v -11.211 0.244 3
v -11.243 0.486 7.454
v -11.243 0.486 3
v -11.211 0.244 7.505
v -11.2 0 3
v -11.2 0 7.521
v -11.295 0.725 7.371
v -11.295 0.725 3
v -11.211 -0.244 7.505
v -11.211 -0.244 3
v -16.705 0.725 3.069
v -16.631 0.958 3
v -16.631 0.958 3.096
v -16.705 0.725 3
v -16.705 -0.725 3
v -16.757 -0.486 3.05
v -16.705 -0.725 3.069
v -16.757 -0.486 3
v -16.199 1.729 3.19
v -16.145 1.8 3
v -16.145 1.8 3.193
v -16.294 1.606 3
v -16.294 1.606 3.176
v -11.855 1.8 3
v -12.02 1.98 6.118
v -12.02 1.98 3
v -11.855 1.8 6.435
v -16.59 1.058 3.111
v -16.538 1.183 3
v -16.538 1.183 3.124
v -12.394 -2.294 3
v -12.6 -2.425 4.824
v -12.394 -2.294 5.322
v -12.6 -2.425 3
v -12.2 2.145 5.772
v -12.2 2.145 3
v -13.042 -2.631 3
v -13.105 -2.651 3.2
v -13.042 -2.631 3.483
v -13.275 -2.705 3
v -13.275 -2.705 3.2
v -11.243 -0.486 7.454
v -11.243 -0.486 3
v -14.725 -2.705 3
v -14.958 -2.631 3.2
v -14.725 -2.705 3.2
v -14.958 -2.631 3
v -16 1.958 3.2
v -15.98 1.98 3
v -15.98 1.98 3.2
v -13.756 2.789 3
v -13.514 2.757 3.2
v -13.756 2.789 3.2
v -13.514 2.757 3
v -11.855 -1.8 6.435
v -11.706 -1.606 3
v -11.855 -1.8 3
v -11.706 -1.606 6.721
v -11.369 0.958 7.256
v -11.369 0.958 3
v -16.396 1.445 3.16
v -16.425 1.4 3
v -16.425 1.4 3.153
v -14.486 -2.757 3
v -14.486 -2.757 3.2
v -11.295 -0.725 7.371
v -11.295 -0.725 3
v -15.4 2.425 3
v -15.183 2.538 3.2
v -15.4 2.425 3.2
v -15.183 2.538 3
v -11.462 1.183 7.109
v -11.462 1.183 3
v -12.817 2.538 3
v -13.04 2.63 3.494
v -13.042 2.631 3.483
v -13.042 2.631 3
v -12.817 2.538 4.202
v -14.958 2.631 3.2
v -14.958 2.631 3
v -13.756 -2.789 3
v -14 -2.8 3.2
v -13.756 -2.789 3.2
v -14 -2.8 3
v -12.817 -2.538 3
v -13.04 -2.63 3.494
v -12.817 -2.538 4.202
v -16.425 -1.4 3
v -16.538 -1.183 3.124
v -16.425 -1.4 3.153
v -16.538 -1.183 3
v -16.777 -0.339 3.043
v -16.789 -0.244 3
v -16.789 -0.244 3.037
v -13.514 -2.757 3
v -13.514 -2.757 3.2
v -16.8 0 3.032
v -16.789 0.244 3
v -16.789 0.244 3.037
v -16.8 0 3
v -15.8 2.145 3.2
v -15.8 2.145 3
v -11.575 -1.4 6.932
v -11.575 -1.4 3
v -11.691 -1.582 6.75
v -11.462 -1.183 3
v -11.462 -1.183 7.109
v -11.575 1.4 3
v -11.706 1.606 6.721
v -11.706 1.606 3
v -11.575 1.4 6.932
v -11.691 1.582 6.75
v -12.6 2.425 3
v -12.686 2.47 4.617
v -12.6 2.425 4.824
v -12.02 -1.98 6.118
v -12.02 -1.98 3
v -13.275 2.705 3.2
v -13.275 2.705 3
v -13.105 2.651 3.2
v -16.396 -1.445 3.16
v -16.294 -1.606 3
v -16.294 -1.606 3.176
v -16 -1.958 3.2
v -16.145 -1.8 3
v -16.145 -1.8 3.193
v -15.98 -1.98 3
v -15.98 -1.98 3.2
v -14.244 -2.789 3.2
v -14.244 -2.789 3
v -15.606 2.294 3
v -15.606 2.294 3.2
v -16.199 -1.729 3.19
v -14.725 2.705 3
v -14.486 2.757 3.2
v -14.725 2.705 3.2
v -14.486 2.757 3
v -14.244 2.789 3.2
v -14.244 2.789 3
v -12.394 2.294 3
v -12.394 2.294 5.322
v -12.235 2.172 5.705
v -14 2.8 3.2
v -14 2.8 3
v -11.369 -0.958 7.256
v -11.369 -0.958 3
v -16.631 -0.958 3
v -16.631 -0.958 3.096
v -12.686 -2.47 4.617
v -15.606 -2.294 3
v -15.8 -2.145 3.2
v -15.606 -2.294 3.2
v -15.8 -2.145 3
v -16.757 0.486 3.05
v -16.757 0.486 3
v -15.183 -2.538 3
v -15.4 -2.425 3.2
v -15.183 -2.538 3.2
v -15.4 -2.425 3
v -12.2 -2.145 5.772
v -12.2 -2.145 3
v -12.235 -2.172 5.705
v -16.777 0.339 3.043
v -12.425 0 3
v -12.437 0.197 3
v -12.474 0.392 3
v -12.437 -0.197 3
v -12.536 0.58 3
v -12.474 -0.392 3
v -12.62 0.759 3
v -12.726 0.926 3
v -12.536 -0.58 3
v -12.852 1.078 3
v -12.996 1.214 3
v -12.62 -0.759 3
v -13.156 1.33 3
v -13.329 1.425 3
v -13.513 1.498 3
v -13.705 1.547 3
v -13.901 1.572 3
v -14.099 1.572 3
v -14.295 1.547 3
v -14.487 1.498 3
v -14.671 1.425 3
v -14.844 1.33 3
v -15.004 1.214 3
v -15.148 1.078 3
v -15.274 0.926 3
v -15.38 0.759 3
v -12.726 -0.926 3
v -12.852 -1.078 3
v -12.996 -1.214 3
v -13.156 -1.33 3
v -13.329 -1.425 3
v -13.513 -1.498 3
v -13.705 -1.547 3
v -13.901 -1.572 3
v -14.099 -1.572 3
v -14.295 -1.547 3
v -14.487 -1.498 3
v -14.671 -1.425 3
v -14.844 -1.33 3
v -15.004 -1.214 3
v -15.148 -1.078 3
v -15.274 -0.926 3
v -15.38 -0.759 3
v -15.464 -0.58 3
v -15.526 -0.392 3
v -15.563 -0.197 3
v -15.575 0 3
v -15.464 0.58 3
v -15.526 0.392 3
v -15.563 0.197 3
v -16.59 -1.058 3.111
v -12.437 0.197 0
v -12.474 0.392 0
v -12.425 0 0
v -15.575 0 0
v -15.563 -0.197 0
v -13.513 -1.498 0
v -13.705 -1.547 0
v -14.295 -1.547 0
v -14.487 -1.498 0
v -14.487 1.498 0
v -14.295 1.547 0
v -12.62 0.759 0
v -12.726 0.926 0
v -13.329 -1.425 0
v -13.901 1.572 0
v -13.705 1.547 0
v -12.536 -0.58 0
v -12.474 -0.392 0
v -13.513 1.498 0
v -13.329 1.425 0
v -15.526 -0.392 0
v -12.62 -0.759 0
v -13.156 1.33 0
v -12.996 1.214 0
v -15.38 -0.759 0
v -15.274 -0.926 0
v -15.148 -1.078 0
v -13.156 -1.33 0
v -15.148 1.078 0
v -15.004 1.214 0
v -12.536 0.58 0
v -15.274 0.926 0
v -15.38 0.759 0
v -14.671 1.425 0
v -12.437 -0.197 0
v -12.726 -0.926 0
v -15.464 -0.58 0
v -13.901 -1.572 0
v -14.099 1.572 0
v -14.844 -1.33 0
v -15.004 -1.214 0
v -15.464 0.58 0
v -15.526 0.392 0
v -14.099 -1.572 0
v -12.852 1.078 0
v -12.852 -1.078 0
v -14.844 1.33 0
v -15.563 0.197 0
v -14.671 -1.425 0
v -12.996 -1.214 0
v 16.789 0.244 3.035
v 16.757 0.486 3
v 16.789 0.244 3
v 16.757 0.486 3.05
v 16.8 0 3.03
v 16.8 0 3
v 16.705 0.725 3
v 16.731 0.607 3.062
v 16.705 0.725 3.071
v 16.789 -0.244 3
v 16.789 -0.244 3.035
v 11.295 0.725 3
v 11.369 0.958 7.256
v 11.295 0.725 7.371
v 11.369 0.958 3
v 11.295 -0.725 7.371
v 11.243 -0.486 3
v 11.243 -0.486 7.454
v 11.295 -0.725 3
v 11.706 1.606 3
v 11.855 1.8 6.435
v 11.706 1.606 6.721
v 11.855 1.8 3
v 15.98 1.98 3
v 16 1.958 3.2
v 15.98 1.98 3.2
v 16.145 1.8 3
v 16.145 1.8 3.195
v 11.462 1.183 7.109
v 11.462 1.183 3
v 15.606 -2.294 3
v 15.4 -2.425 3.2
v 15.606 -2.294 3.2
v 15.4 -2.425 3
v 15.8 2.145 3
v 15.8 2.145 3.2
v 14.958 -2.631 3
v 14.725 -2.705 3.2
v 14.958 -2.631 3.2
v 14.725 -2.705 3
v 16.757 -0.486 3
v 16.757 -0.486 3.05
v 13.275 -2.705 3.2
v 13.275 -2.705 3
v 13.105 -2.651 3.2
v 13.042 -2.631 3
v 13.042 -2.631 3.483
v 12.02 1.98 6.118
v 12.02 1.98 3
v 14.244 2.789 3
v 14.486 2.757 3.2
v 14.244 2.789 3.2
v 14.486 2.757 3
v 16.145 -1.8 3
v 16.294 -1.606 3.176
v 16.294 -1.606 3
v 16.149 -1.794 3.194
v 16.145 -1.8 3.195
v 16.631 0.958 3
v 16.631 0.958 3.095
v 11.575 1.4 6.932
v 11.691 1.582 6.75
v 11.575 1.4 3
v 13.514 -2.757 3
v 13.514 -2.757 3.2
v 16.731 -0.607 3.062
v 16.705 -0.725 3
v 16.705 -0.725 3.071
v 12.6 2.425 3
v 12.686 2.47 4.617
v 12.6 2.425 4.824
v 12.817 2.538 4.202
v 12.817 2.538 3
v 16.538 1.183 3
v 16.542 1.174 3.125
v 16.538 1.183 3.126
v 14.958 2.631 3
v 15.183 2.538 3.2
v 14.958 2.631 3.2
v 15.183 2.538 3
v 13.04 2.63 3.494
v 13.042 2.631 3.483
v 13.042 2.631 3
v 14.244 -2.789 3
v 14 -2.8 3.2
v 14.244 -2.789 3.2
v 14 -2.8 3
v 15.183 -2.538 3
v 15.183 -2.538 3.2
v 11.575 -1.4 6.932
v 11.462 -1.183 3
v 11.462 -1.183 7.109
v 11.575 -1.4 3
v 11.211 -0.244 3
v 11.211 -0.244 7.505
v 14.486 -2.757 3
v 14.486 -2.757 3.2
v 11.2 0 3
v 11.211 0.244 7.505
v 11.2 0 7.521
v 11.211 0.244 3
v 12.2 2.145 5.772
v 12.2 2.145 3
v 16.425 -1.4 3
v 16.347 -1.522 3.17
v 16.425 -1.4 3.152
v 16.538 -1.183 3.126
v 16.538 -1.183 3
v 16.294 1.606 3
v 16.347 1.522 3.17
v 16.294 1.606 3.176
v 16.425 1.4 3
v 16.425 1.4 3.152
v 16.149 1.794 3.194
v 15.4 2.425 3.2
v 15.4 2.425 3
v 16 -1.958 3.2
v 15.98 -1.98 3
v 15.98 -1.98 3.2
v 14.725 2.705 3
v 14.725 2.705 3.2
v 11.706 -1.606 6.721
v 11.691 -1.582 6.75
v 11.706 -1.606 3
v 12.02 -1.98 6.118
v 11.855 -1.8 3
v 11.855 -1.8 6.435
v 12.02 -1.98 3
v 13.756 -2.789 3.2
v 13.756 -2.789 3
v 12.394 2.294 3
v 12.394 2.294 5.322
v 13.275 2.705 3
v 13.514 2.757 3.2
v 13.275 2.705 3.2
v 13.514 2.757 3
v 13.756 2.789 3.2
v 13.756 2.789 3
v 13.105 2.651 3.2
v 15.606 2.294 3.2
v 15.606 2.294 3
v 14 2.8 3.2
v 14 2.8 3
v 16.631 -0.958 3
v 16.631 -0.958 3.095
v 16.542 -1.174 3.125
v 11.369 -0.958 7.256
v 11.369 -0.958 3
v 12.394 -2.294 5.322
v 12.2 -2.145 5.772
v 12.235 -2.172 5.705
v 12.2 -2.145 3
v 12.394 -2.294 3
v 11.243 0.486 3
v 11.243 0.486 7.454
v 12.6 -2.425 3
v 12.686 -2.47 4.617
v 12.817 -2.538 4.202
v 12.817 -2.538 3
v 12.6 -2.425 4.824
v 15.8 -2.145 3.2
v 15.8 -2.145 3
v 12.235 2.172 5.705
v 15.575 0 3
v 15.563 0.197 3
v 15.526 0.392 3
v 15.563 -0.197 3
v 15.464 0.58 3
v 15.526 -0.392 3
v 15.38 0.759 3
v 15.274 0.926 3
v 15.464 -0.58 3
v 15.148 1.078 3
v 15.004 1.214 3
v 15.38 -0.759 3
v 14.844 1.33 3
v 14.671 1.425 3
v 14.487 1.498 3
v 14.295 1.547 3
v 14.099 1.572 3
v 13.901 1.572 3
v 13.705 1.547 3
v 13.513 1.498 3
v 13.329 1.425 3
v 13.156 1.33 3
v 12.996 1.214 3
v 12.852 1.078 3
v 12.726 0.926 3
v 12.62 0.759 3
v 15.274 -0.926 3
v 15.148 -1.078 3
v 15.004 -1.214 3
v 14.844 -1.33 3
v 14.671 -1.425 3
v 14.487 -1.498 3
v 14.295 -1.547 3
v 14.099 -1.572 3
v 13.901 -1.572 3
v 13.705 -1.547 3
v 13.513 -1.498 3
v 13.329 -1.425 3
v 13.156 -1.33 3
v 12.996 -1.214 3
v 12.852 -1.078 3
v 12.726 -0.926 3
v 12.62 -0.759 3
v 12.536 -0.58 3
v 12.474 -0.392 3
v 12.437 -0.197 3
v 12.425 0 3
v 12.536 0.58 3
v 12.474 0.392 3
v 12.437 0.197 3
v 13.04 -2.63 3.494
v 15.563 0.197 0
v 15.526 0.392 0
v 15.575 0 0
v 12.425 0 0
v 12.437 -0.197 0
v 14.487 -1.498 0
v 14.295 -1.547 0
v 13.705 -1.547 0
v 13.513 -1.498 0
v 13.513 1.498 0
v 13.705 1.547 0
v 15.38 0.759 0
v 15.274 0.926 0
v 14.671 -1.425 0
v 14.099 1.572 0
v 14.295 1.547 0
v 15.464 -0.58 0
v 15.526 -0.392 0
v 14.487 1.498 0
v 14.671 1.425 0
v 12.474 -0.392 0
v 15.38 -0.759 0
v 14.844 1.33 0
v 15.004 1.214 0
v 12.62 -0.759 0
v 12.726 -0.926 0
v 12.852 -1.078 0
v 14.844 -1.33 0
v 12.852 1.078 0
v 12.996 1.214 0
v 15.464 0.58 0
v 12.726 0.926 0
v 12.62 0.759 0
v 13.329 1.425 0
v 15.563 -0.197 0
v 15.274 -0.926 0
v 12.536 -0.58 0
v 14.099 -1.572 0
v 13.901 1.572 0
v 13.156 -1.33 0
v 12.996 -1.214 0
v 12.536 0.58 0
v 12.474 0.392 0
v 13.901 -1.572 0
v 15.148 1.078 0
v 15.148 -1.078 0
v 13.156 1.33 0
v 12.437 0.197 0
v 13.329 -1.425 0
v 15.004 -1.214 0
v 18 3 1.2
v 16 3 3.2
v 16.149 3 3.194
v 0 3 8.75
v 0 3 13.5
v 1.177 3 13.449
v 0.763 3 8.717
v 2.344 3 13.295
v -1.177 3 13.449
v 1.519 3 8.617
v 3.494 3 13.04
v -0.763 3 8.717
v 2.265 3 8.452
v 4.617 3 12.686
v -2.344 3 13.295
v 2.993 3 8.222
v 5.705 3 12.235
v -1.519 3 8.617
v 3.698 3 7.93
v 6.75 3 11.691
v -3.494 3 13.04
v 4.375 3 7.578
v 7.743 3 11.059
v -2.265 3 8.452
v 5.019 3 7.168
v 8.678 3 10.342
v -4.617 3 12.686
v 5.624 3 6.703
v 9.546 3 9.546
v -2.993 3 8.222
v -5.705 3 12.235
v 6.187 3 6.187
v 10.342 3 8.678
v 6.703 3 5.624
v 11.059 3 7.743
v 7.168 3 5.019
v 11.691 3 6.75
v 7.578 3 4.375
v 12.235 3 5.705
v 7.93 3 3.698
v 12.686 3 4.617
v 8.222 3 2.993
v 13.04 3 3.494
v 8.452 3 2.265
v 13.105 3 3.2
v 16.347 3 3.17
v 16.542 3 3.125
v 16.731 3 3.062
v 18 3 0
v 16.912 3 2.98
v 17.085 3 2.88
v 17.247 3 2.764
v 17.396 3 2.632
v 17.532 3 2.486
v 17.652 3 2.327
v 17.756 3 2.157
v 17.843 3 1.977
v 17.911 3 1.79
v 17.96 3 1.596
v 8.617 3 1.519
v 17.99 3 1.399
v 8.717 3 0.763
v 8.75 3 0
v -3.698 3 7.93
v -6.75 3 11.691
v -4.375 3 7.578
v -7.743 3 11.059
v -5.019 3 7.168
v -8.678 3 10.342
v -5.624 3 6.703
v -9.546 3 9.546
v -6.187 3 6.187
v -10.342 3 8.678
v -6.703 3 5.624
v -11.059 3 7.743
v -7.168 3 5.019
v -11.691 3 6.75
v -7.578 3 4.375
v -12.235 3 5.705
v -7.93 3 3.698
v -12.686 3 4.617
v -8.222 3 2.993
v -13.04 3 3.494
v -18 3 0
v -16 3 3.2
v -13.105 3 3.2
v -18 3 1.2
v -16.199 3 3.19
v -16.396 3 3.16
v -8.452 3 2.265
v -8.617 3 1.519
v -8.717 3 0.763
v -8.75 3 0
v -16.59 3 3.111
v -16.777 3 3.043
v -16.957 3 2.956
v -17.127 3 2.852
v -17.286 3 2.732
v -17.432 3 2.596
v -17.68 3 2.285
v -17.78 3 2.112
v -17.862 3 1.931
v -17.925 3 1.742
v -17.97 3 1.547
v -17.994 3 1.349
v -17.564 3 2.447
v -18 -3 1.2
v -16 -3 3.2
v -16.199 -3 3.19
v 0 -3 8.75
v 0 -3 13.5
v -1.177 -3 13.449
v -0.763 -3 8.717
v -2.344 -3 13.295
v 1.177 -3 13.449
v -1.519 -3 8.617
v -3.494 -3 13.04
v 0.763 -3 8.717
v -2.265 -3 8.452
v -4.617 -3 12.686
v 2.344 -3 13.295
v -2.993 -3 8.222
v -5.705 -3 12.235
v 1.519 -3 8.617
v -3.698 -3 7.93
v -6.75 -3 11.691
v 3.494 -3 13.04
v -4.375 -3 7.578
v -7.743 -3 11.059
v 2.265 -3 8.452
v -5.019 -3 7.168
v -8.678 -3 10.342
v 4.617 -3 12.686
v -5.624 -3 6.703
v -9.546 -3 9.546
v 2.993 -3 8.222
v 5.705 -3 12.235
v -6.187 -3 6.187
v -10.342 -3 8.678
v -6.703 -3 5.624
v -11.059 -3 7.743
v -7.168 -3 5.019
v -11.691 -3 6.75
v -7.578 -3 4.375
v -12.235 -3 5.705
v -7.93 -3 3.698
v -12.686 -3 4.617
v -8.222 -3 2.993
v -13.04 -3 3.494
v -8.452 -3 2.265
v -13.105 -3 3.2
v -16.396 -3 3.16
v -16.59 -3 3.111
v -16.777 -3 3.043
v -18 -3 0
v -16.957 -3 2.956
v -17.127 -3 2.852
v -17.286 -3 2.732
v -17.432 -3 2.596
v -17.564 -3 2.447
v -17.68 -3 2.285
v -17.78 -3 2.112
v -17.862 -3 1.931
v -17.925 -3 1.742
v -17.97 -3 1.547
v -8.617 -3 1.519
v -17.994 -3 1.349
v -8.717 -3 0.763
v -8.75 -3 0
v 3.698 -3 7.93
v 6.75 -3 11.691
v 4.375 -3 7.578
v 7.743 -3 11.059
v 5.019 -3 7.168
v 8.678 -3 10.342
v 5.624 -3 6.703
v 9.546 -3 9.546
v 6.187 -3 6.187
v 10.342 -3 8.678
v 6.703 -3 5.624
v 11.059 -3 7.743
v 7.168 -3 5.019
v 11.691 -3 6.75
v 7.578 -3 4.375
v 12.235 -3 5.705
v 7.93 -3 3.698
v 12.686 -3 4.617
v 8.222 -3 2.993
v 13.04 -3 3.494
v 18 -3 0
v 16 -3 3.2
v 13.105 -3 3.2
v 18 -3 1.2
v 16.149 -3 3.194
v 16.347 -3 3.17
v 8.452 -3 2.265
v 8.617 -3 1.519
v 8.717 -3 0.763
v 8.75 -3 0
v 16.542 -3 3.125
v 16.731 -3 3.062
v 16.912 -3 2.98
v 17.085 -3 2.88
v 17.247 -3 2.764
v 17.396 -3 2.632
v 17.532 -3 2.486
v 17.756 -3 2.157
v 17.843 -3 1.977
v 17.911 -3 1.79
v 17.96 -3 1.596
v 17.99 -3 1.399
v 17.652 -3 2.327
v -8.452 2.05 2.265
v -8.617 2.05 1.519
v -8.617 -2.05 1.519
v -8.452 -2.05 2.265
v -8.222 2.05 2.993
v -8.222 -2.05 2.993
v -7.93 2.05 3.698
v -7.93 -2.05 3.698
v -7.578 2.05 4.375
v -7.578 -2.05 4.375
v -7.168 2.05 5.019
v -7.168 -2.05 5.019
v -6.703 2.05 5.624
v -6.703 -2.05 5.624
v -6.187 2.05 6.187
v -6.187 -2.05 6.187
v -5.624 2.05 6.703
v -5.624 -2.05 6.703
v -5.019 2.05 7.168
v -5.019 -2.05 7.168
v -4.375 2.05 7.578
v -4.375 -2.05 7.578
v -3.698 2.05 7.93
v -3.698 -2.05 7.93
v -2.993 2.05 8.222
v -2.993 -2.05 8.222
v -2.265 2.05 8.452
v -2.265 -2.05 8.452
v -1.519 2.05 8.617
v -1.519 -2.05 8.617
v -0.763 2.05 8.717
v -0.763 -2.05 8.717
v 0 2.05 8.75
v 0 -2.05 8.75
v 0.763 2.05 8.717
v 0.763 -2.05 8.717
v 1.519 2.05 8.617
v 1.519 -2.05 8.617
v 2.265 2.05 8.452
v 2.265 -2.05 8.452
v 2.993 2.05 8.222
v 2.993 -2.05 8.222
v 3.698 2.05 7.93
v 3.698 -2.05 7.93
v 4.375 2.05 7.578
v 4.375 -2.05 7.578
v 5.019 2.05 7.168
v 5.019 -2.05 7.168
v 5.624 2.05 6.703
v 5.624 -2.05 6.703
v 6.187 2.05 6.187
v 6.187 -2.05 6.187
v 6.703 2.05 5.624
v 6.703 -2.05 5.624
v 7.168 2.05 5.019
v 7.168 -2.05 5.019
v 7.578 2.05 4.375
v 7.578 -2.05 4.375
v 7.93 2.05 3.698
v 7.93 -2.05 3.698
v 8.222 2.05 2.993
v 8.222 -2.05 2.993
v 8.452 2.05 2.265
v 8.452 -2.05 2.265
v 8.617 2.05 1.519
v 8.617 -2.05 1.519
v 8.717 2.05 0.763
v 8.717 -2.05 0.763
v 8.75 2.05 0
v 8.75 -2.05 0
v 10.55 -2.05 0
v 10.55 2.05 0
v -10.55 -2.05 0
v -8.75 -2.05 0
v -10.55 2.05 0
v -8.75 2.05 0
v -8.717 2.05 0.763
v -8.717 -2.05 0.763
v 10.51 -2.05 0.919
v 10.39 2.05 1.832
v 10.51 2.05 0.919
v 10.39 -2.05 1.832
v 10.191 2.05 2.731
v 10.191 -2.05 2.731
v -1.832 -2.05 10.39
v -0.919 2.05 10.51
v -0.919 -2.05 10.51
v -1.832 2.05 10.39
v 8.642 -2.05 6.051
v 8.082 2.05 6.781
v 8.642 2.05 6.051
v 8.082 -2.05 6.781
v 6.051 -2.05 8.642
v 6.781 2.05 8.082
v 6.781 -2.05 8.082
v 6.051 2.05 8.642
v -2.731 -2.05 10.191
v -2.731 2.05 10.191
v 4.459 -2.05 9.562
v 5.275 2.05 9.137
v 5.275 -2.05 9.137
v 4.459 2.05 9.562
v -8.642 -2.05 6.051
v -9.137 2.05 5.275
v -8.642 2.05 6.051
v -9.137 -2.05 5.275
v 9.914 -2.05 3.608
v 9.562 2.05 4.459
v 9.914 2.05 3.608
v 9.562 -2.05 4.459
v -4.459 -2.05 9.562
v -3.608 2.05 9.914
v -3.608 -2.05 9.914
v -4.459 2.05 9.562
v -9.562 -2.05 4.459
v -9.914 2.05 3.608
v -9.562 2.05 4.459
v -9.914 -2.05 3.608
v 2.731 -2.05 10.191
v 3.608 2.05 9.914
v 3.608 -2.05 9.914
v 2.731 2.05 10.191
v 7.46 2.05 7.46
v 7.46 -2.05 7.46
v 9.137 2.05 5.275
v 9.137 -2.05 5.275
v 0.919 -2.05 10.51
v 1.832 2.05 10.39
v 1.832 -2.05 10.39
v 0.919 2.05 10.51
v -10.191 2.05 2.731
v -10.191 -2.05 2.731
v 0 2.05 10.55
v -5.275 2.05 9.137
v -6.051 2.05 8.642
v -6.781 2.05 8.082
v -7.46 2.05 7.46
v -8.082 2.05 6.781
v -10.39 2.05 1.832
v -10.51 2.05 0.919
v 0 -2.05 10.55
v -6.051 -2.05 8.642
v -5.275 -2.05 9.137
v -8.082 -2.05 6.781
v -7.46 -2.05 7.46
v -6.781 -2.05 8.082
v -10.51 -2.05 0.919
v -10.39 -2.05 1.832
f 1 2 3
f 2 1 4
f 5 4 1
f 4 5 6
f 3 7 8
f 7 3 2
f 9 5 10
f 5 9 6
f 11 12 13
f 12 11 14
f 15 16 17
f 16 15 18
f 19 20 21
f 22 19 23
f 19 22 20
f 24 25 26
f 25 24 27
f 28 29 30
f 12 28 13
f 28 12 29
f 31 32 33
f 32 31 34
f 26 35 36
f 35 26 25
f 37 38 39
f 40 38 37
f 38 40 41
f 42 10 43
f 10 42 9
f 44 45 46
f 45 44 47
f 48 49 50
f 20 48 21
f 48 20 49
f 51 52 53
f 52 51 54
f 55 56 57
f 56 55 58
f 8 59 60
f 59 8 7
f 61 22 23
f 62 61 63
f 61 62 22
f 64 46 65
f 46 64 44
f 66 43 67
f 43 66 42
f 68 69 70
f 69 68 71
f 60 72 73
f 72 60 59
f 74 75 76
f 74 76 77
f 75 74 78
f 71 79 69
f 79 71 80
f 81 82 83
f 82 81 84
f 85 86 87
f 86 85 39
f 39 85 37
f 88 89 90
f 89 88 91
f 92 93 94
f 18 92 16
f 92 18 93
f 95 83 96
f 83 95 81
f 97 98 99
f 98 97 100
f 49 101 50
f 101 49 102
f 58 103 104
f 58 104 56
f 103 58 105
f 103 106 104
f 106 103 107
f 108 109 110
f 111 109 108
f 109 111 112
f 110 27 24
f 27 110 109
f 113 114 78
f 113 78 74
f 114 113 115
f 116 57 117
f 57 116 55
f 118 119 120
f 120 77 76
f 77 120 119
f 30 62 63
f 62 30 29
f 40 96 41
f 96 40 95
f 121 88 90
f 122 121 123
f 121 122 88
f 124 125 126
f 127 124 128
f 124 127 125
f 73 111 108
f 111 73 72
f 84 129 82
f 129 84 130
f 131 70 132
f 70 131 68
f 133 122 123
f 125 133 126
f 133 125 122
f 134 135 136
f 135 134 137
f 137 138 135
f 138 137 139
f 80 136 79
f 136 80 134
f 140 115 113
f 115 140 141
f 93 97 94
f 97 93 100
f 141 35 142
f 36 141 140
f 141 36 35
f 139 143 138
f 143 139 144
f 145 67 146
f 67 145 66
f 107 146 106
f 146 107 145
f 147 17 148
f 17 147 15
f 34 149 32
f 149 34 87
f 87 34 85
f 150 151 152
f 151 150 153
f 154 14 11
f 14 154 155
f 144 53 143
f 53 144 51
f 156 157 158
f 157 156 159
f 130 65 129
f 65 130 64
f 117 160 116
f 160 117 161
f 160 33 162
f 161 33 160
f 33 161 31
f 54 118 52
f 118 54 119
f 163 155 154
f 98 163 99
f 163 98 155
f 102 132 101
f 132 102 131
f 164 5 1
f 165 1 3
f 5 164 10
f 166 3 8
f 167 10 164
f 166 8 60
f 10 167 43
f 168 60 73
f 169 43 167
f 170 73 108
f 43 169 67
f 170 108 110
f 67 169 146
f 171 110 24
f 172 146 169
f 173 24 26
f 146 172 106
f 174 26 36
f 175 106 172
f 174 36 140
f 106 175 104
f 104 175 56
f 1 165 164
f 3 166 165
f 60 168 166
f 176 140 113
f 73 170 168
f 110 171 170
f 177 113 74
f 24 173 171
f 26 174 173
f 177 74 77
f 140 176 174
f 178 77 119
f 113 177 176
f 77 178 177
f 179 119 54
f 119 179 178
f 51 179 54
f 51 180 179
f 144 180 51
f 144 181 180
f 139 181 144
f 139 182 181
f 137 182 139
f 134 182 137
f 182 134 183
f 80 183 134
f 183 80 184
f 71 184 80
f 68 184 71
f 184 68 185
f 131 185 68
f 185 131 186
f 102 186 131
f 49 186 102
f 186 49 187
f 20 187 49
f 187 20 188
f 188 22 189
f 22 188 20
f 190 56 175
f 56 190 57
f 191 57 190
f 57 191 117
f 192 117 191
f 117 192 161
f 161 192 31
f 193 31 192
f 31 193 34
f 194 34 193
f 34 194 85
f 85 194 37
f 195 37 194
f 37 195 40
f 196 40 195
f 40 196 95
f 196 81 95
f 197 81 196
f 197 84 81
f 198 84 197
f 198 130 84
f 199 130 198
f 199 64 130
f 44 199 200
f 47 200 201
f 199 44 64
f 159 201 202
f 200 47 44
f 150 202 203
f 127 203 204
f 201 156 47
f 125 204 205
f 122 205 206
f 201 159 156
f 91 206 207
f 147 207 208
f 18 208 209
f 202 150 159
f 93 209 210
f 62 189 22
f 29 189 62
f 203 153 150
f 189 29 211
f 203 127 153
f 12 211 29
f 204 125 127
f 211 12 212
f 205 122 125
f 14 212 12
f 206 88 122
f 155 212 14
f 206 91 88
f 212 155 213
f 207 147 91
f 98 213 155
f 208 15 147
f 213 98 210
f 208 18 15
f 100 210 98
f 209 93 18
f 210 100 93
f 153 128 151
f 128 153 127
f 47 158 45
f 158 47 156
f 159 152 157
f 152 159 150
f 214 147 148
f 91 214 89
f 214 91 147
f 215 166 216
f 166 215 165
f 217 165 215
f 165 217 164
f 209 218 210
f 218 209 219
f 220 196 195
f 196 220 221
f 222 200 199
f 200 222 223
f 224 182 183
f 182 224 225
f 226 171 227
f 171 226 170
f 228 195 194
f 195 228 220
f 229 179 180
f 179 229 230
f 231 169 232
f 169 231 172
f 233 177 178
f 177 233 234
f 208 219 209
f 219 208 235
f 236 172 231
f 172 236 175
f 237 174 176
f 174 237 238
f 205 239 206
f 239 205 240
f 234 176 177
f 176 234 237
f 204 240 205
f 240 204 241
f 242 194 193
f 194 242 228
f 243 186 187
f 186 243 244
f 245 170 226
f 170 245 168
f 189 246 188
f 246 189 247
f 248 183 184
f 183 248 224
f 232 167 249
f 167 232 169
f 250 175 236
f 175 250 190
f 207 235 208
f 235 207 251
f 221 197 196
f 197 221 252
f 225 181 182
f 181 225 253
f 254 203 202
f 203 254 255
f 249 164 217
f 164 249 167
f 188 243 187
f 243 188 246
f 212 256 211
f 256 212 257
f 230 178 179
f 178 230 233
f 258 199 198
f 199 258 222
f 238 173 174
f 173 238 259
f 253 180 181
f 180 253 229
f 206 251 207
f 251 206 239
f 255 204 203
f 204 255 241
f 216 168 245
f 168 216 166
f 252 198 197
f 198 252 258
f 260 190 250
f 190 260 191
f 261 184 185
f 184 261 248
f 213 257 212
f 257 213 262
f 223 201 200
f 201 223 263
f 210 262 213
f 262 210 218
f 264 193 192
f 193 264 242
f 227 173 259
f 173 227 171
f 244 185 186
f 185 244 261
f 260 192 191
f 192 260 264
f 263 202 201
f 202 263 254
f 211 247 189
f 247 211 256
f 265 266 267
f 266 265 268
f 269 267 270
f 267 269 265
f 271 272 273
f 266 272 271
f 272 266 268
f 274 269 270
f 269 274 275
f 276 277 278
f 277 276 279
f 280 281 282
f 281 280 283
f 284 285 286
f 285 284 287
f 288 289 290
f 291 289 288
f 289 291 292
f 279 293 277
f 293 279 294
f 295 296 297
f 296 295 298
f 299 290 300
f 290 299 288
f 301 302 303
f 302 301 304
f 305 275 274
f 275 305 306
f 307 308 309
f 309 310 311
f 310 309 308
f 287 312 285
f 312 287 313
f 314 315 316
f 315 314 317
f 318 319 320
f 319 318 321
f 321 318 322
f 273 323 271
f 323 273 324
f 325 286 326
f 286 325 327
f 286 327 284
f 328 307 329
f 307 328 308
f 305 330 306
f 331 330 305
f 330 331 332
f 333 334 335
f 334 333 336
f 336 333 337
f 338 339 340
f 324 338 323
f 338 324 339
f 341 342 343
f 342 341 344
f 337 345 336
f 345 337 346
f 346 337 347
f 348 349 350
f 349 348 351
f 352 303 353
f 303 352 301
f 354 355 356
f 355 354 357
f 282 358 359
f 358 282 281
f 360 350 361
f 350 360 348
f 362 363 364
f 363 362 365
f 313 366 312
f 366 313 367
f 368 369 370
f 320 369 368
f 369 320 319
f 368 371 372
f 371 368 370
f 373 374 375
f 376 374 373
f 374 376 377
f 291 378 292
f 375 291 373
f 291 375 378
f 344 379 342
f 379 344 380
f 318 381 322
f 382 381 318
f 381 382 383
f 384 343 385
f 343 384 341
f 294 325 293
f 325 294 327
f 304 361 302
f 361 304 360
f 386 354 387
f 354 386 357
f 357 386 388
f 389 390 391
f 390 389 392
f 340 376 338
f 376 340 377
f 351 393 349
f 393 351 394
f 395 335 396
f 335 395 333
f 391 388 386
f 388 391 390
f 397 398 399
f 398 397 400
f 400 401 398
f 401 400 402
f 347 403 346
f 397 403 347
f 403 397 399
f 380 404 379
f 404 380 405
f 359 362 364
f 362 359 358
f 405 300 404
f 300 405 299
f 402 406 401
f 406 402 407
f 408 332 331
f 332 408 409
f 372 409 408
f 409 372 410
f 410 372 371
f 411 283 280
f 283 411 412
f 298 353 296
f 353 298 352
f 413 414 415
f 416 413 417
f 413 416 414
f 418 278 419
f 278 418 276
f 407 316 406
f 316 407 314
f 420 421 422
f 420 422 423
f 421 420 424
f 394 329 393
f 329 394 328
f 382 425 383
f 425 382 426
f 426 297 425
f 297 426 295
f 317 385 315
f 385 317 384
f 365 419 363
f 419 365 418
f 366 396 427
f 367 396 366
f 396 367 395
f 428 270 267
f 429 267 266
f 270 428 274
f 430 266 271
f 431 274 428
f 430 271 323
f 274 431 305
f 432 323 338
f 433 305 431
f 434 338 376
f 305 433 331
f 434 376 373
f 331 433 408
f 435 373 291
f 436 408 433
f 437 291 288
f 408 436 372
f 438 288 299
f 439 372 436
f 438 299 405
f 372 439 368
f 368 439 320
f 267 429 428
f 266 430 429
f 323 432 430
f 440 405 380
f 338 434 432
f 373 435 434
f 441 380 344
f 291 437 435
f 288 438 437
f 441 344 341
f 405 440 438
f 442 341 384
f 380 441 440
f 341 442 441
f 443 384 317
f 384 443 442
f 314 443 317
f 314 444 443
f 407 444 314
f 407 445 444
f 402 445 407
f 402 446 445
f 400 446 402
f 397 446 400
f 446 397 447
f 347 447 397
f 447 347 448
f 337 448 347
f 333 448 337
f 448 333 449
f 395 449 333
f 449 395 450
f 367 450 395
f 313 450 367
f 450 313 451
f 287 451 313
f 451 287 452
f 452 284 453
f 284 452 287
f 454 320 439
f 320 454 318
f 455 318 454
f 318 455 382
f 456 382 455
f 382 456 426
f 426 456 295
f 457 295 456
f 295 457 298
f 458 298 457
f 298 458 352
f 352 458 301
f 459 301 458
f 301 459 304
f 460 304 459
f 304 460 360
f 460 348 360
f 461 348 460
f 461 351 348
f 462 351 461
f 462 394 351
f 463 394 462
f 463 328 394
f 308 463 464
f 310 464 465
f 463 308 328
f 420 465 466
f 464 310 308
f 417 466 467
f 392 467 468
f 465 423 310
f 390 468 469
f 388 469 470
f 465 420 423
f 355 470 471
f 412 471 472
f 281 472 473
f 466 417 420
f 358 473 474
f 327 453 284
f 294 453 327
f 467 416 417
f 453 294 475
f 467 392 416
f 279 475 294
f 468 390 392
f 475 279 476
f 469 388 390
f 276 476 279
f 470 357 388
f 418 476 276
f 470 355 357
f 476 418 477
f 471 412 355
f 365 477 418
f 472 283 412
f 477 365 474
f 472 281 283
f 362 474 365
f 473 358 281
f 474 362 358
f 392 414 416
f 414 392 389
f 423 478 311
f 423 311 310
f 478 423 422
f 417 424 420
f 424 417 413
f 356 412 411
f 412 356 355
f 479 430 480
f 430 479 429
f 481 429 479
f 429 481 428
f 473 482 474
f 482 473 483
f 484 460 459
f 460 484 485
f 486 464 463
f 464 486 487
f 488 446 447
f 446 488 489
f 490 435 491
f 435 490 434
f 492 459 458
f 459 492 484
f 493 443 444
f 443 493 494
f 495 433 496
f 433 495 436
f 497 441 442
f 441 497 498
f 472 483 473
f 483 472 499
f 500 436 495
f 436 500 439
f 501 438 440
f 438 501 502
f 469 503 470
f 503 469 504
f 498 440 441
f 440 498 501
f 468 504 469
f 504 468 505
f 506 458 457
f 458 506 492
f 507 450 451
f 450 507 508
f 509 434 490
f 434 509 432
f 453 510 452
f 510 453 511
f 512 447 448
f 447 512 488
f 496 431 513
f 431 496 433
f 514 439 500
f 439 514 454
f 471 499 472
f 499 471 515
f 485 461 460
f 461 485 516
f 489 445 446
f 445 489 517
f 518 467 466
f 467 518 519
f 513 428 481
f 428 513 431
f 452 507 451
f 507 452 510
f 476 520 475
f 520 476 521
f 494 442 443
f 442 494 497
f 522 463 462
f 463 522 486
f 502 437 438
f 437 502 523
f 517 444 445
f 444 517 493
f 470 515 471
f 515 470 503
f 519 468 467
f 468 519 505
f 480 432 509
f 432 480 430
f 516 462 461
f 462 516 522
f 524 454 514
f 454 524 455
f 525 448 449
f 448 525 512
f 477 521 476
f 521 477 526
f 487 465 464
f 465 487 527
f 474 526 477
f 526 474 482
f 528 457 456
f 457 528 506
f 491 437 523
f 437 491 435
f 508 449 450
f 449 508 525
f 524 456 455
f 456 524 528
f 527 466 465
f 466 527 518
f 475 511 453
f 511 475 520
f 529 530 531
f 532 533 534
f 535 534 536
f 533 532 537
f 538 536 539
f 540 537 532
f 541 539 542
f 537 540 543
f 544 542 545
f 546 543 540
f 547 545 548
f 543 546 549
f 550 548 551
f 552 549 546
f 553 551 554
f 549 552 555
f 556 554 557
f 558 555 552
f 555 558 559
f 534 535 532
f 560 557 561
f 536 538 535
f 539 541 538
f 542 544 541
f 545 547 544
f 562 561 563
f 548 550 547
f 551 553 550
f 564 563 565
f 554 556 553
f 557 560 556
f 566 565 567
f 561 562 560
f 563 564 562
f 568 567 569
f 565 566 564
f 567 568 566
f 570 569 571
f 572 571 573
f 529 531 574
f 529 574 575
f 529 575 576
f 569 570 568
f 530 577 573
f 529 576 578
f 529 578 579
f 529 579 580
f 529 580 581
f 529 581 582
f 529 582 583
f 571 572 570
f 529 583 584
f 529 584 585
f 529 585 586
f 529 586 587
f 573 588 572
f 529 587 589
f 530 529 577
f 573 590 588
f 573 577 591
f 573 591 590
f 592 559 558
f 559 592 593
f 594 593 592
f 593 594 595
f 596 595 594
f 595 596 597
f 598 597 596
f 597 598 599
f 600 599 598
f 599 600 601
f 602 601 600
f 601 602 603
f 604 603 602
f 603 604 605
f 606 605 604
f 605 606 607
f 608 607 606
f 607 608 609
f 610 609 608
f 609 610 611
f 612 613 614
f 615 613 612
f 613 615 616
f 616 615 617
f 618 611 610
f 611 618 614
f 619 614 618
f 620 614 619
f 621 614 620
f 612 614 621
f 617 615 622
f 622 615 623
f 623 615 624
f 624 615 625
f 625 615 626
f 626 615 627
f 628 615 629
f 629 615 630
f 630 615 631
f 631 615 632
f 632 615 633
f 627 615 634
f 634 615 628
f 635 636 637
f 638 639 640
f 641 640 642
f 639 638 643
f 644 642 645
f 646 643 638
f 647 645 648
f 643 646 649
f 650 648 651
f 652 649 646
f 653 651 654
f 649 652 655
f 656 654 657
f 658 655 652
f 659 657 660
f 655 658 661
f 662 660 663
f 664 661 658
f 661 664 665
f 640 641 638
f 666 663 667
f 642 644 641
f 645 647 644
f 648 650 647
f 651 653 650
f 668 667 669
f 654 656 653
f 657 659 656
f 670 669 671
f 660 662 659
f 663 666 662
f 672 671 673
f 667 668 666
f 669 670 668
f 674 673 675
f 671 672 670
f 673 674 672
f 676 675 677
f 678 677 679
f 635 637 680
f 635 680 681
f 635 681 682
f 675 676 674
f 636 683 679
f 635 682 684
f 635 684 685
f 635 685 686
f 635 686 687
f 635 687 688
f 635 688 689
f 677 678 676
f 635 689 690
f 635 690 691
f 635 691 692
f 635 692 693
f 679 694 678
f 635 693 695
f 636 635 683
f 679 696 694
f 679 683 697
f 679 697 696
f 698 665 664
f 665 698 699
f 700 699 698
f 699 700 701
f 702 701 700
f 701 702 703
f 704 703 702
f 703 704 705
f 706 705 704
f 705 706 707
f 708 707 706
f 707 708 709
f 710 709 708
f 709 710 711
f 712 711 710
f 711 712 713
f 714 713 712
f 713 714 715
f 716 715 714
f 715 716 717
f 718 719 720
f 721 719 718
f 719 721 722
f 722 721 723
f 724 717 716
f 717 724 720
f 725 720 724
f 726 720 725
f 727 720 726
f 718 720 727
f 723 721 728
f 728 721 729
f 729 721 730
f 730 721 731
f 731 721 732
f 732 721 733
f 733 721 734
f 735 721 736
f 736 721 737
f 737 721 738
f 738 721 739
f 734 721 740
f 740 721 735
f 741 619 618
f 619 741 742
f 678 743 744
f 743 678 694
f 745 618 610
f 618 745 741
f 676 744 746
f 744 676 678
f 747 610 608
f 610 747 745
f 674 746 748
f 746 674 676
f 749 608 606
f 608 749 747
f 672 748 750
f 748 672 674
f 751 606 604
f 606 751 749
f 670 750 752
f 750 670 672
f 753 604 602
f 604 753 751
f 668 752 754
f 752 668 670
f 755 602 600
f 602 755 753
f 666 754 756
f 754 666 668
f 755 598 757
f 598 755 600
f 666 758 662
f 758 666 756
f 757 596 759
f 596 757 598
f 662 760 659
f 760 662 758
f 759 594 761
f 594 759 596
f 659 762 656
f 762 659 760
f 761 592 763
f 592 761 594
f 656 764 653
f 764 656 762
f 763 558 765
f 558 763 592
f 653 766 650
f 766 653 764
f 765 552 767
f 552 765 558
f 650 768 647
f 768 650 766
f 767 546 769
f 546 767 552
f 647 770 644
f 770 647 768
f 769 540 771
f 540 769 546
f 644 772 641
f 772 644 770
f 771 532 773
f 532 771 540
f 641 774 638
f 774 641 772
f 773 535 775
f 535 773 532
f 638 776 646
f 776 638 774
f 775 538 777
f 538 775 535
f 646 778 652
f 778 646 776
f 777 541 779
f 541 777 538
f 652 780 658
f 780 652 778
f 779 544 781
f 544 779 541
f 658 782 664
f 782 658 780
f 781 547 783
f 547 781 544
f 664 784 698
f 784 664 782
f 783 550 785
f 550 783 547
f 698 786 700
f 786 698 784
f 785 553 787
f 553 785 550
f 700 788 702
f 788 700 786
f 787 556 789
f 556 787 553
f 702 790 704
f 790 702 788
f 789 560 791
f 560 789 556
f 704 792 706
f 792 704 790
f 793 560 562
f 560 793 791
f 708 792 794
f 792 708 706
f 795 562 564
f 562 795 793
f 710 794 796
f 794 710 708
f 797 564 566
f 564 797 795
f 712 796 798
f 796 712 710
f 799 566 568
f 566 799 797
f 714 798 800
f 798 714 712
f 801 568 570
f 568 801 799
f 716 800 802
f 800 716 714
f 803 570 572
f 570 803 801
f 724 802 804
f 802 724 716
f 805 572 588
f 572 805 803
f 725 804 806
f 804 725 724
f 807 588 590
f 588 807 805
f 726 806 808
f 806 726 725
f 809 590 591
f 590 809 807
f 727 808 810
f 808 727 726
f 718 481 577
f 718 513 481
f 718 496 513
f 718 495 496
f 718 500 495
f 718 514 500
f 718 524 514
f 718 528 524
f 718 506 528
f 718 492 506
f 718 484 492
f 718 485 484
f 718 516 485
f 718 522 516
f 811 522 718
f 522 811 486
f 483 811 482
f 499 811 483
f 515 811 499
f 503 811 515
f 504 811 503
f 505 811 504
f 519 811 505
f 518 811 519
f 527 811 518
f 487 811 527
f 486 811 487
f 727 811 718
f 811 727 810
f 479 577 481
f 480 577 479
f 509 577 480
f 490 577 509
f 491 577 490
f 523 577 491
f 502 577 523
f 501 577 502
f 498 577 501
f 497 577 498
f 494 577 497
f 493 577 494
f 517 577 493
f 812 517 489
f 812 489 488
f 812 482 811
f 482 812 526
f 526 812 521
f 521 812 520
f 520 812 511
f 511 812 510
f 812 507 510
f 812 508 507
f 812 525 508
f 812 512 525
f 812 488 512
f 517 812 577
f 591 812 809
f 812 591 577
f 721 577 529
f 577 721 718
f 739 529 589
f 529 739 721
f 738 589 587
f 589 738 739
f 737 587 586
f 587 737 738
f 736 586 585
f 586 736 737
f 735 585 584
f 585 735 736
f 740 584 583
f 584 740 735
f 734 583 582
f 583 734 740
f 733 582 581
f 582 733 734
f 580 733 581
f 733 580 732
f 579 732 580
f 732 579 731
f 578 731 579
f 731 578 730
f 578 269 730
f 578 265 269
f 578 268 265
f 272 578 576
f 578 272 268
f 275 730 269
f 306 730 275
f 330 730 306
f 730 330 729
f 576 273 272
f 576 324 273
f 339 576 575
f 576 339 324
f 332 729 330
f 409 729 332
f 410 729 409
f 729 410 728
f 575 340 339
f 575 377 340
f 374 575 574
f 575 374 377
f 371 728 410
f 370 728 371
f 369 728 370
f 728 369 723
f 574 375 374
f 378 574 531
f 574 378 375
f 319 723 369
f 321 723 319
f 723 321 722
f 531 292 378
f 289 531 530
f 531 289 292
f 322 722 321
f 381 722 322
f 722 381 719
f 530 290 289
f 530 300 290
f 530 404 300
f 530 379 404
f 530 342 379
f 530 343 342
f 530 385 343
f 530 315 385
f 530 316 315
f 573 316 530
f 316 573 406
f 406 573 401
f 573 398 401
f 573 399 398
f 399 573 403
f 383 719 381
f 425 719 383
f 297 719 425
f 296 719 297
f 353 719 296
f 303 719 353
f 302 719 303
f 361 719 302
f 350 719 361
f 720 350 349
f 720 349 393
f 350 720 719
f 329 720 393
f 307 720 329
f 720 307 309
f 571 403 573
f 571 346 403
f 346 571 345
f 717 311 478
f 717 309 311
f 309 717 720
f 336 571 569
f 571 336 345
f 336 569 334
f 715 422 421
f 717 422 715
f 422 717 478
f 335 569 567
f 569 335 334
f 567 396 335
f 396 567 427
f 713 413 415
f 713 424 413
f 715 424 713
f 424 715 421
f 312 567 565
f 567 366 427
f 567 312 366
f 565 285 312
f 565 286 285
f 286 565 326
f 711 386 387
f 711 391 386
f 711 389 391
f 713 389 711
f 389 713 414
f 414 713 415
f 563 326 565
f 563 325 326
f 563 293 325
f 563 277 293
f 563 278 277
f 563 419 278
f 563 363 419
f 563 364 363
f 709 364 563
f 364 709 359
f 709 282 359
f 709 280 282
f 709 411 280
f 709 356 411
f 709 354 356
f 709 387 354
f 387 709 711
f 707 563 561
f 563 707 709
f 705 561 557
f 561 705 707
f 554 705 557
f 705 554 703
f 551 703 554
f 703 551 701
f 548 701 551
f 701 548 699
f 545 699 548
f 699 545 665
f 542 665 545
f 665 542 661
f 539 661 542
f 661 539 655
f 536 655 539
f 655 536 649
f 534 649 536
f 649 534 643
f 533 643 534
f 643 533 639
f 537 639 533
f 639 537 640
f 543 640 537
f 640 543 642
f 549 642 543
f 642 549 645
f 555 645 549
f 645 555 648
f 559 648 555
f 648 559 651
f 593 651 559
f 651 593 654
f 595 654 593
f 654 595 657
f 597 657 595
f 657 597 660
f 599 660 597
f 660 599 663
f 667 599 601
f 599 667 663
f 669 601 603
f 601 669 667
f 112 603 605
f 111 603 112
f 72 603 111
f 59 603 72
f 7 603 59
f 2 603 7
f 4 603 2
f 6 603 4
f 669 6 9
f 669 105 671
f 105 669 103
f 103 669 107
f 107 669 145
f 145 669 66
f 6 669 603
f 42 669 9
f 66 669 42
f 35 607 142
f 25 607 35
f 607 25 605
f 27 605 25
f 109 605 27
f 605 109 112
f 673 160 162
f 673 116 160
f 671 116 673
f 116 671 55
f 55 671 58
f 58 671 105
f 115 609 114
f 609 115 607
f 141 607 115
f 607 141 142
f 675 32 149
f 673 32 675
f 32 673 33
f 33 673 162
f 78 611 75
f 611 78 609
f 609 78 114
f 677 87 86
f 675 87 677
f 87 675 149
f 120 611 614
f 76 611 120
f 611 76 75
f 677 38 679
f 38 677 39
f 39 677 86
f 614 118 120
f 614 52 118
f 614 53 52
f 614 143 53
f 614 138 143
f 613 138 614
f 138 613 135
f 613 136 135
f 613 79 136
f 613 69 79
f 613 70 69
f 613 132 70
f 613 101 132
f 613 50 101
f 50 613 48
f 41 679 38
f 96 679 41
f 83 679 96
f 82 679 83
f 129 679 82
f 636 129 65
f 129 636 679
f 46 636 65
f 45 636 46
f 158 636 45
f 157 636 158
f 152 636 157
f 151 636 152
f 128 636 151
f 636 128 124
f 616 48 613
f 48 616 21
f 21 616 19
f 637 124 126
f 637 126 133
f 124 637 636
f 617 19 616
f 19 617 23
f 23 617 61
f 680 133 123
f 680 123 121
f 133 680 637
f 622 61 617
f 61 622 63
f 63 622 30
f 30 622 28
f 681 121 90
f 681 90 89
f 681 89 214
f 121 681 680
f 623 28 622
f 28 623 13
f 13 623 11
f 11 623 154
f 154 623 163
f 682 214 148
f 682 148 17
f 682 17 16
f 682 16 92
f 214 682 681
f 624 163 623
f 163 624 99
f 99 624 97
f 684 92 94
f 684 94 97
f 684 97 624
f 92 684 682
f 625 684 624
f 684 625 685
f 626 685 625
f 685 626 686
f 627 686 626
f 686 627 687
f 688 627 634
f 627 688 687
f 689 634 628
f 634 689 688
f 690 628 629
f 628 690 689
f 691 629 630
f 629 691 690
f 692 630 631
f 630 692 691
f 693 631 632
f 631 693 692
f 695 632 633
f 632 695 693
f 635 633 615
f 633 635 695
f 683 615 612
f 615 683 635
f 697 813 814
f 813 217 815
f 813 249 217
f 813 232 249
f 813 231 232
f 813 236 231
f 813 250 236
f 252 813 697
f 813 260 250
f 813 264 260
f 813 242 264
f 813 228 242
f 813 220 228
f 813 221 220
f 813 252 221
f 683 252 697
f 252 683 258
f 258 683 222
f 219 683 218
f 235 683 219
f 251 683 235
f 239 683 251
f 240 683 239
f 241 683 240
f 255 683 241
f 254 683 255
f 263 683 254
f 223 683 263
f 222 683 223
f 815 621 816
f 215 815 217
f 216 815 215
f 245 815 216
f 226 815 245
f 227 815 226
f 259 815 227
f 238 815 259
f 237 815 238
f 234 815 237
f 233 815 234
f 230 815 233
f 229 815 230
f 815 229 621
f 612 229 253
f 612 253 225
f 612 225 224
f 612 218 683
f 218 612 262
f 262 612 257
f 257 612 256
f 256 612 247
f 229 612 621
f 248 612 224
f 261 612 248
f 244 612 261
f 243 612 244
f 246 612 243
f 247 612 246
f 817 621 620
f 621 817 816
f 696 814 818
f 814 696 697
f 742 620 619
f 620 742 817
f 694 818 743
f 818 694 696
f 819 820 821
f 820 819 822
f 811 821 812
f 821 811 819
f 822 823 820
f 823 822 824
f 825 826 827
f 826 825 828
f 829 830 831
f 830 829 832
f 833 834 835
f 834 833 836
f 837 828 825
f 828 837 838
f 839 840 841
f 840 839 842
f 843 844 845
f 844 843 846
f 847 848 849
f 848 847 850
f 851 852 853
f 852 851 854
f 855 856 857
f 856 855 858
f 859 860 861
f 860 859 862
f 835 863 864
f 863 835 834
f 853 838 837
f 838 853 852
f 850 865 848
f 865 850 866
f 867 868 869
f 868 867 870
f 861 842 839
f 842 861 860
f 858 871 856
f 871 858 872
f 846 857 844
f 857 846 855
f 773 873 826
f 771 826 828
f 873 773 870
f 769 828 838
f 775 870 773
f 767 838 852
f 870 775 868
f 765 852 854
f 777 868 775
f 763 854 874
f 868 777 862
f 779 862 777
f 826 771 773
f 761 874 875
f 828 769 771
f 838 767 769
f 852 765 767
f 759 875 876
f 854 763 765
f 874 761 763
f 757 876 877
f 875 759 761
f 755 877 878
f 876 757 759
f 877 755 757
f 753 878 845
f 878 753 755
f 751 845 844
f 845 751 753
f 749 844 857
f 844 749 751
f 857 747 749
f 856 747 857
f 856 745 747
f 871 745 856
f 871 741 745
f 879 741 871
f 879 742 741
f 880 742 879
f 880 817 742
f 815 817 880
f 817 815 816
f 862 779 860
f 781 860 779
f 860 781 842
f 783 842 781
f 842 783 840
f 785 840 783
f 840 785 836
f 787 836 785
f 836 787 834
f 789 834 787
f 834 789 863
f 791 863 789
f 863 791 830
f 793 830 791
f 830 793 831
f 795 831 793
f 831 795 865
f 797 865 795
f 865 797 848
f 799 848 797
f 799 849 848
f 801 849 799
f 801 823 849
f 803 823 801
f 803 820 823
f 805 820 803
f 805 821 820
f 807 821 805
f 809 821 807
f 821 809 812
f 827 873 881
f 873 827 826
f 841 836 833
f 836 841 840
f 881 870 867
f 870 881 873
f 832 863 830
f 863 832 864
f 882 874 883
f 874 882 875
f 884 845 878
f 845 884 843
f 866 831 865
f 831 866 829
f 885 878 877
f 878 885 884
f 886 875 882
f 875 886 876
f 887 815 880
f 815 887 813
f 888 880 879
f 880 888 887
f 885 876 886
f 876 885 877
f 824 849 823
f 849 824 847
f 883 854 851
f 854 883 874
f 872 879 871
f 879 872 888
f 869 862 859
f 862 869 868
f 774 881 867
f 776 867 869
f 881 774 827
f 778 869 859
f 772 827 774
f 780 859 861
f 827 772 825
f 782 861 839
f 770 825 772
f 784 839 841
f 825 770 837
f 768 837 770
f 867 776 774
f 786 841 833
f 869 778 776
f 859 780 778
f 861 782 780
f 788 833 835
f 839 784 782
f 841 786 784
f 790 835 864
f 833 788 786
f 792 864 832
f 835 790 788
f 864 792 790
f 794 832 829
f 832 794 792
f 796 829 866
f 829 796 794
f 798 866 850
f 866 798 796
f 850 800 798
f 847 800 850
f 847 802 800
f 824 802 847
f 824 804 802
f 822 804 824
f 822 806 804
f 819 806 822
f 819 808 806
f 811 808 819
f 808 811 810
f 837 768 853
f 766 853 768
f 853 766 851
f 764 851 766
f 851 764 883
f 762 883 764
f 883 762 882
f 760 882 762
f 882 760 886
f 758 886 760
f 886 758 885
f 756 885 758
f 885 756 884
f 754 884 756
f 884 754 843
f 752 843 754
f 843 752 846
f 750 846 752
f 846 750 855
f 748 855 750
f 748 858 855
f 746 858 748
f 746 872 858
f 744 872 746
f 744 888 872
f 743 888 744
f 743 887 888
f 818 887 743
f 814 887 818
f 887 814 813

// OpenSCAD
rotate([90,0,0])
difference() {
	linear_extrude(height=6,center=true,convexity=3) difference() {
		union() {
			circle(d=27);
			offset(r=2) offset(r=-2)
			square([36,6.4],center=true);
		}
		circle(d=17.5);
		translate([0,-50/2]) square(50,center=true);
	}
	cylinder(d=21.1,h=4.1,center=true);
	for (i=[-1,1])
	translate([14*i,0,0]) rotate([-90,0,0]) {
		translate([0,0,3])
		cylinder(d=5.6,h=100);
		cylinder(d=3.15,h=100,center=true);
	}
}



$fs=.2;
$fa=5;
